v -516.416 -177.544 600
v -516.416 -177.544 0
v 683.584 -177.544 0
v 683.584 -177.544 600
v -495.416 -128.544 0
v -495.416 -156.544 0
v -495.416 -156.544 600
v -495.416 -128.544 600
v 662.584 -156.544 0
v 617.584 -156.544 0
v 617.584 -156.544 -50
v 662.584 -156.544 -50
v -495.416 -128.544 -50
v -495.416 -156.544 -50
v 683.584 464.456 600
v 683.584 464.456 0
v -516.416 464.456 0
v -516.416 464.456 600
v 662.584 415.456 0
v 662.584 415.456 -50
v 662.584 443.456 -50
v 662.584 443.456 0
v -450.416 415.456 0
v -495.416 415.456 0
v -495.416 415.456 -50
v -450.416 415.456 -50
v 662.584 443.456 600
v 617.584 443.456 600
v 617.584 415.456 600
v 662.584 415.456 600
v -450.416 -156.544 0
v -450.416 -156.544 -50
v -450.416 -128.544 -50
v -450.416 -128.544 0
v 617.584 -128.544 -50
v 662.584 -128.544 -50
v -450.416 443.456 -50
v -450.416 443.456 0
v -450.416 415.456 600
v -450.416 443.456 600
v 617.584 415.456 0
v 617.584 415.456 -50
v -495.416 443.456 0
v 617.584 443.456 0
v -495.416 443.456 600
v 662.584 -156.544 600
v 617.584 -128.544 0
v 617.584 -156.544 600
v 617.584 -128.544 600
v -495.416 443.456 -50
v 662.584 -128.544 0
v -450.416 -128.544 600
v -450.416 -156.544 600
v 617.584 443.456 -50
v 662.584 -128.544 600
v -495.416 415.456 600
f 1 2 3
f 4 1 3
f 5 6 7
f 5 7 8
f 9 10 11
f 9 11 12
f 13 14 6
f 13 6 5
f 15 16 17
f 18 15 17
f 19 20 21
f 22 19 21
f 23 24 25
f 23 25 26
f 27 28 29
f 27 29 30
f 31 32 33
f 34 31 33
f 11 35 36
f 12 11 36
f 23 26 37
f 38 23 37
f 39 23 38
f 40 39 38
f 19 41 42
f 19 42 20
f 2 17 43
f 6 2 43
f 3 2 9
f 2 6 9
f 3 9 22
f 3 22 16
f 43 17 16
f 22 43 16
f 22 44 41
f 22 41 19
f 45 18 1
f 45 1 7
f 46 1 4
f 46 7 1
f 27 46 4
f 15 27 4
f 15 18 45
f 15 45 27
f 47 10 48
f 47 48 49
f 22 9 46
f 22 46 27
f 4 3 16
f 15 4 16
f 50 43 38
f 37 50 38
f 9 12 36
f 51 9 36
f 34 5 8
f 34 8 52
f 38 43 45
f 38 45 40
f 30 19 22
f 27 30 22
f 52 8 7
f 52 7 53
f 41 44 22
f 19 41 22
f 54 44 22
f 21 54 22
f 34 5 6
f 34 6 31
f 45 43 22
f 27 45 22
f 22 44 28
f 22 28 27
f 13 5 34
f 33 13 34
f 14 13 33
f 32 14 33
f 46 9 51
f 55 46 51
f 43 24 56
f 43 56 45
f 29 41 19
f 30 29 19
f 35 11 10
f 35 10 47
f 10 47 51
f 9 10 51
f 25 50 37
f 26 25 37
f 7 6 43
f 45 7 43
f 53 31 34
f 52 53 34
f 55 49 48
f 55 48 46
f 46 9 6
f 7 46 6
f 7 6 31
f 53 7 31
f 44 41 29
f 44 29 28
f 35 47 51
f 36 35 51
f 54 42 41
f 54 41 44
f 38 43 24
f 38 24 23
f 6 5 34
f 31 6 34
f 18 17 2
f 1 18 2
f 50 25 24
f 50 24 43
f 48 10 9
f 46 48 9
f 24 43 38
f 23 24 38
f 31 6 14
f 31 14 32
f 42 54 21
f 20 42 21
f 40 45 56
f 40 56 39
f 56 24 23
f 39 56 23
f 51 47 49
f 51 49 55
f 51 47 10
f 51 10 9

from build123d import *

# Parameters (mm, degrees)
F0_W     = 21
F0_H     = 600
F1_DEPTH = 600
F2_W     = 45
F2_H     = 28
F3_DEPTH = 600
F4_DEPTH = 50


with BuildPart() as f1:
    # F0 (on Top) → F1 (new body)
    with BuildSketch(Plane.XY):
        with Locations((-505.91643, 143.455748)):
            Rectangle(F0_W, F0_H)
        Polygon((-495.41643, -156.544252), (-516.41643, -156.544252), (-516.41643, -177.544252), (683.58357, -177.544252), (683.58357, -156.544252), (662.58357, -156.544252), align=None)
        Polygon((-516.41643, 464.455748), (-516.41643, 443.455748), (-495.41643, 443.455748), (662.58357, 443.455748), (683.58357, 443.455748), (683.58357, 464.455748), align=None)
        with Locations((673.08357, 143.455748)):
            Rectangle(F0_W, F0_H)
    extrude(amount=F1_DEPTH)


with BuildPart() as f3:
    # F2 (on Top) → F3 (new body)
    with BuildSketch(Plane.XY):
        with Locations((-472.91643, 429.455748)):
            Rectangle(F2_W, F2_H)
        with Locations((640.08357, 429.455748)):
            Rectangle(F2_W, F2_H)
        with Locations((640.08357, -142.544252)):
            Rectangle(F2_W, F2_H)
        with Locations((-472.91643, -142.544252)):
            Rectangle(F2_W, F2_H)
    extrude(amount=F3_DEPTH)


with BuildPart() as f4:
    # F2 (on Top) → F4 (new body)
    with BuildSketch(Plane.XY):
        with Locations((-472.91643, 429.455748)):
            Rectangle(F2_W, F2_H)
        with Locations((640.08357, 429.455748)):
            Rectangle(F2_W, F2_H)
        with Locations((640.08357, -142.544252)):
            Rectangle(F2_W, F2_H)
        with Locations((-472.91643, -142.544252)):
            Rectangle(F2_W, F2_H)
    extrude(amount=-F4_DEPTH)


solid = Compound([f1.part, f3.part, f4.part])
